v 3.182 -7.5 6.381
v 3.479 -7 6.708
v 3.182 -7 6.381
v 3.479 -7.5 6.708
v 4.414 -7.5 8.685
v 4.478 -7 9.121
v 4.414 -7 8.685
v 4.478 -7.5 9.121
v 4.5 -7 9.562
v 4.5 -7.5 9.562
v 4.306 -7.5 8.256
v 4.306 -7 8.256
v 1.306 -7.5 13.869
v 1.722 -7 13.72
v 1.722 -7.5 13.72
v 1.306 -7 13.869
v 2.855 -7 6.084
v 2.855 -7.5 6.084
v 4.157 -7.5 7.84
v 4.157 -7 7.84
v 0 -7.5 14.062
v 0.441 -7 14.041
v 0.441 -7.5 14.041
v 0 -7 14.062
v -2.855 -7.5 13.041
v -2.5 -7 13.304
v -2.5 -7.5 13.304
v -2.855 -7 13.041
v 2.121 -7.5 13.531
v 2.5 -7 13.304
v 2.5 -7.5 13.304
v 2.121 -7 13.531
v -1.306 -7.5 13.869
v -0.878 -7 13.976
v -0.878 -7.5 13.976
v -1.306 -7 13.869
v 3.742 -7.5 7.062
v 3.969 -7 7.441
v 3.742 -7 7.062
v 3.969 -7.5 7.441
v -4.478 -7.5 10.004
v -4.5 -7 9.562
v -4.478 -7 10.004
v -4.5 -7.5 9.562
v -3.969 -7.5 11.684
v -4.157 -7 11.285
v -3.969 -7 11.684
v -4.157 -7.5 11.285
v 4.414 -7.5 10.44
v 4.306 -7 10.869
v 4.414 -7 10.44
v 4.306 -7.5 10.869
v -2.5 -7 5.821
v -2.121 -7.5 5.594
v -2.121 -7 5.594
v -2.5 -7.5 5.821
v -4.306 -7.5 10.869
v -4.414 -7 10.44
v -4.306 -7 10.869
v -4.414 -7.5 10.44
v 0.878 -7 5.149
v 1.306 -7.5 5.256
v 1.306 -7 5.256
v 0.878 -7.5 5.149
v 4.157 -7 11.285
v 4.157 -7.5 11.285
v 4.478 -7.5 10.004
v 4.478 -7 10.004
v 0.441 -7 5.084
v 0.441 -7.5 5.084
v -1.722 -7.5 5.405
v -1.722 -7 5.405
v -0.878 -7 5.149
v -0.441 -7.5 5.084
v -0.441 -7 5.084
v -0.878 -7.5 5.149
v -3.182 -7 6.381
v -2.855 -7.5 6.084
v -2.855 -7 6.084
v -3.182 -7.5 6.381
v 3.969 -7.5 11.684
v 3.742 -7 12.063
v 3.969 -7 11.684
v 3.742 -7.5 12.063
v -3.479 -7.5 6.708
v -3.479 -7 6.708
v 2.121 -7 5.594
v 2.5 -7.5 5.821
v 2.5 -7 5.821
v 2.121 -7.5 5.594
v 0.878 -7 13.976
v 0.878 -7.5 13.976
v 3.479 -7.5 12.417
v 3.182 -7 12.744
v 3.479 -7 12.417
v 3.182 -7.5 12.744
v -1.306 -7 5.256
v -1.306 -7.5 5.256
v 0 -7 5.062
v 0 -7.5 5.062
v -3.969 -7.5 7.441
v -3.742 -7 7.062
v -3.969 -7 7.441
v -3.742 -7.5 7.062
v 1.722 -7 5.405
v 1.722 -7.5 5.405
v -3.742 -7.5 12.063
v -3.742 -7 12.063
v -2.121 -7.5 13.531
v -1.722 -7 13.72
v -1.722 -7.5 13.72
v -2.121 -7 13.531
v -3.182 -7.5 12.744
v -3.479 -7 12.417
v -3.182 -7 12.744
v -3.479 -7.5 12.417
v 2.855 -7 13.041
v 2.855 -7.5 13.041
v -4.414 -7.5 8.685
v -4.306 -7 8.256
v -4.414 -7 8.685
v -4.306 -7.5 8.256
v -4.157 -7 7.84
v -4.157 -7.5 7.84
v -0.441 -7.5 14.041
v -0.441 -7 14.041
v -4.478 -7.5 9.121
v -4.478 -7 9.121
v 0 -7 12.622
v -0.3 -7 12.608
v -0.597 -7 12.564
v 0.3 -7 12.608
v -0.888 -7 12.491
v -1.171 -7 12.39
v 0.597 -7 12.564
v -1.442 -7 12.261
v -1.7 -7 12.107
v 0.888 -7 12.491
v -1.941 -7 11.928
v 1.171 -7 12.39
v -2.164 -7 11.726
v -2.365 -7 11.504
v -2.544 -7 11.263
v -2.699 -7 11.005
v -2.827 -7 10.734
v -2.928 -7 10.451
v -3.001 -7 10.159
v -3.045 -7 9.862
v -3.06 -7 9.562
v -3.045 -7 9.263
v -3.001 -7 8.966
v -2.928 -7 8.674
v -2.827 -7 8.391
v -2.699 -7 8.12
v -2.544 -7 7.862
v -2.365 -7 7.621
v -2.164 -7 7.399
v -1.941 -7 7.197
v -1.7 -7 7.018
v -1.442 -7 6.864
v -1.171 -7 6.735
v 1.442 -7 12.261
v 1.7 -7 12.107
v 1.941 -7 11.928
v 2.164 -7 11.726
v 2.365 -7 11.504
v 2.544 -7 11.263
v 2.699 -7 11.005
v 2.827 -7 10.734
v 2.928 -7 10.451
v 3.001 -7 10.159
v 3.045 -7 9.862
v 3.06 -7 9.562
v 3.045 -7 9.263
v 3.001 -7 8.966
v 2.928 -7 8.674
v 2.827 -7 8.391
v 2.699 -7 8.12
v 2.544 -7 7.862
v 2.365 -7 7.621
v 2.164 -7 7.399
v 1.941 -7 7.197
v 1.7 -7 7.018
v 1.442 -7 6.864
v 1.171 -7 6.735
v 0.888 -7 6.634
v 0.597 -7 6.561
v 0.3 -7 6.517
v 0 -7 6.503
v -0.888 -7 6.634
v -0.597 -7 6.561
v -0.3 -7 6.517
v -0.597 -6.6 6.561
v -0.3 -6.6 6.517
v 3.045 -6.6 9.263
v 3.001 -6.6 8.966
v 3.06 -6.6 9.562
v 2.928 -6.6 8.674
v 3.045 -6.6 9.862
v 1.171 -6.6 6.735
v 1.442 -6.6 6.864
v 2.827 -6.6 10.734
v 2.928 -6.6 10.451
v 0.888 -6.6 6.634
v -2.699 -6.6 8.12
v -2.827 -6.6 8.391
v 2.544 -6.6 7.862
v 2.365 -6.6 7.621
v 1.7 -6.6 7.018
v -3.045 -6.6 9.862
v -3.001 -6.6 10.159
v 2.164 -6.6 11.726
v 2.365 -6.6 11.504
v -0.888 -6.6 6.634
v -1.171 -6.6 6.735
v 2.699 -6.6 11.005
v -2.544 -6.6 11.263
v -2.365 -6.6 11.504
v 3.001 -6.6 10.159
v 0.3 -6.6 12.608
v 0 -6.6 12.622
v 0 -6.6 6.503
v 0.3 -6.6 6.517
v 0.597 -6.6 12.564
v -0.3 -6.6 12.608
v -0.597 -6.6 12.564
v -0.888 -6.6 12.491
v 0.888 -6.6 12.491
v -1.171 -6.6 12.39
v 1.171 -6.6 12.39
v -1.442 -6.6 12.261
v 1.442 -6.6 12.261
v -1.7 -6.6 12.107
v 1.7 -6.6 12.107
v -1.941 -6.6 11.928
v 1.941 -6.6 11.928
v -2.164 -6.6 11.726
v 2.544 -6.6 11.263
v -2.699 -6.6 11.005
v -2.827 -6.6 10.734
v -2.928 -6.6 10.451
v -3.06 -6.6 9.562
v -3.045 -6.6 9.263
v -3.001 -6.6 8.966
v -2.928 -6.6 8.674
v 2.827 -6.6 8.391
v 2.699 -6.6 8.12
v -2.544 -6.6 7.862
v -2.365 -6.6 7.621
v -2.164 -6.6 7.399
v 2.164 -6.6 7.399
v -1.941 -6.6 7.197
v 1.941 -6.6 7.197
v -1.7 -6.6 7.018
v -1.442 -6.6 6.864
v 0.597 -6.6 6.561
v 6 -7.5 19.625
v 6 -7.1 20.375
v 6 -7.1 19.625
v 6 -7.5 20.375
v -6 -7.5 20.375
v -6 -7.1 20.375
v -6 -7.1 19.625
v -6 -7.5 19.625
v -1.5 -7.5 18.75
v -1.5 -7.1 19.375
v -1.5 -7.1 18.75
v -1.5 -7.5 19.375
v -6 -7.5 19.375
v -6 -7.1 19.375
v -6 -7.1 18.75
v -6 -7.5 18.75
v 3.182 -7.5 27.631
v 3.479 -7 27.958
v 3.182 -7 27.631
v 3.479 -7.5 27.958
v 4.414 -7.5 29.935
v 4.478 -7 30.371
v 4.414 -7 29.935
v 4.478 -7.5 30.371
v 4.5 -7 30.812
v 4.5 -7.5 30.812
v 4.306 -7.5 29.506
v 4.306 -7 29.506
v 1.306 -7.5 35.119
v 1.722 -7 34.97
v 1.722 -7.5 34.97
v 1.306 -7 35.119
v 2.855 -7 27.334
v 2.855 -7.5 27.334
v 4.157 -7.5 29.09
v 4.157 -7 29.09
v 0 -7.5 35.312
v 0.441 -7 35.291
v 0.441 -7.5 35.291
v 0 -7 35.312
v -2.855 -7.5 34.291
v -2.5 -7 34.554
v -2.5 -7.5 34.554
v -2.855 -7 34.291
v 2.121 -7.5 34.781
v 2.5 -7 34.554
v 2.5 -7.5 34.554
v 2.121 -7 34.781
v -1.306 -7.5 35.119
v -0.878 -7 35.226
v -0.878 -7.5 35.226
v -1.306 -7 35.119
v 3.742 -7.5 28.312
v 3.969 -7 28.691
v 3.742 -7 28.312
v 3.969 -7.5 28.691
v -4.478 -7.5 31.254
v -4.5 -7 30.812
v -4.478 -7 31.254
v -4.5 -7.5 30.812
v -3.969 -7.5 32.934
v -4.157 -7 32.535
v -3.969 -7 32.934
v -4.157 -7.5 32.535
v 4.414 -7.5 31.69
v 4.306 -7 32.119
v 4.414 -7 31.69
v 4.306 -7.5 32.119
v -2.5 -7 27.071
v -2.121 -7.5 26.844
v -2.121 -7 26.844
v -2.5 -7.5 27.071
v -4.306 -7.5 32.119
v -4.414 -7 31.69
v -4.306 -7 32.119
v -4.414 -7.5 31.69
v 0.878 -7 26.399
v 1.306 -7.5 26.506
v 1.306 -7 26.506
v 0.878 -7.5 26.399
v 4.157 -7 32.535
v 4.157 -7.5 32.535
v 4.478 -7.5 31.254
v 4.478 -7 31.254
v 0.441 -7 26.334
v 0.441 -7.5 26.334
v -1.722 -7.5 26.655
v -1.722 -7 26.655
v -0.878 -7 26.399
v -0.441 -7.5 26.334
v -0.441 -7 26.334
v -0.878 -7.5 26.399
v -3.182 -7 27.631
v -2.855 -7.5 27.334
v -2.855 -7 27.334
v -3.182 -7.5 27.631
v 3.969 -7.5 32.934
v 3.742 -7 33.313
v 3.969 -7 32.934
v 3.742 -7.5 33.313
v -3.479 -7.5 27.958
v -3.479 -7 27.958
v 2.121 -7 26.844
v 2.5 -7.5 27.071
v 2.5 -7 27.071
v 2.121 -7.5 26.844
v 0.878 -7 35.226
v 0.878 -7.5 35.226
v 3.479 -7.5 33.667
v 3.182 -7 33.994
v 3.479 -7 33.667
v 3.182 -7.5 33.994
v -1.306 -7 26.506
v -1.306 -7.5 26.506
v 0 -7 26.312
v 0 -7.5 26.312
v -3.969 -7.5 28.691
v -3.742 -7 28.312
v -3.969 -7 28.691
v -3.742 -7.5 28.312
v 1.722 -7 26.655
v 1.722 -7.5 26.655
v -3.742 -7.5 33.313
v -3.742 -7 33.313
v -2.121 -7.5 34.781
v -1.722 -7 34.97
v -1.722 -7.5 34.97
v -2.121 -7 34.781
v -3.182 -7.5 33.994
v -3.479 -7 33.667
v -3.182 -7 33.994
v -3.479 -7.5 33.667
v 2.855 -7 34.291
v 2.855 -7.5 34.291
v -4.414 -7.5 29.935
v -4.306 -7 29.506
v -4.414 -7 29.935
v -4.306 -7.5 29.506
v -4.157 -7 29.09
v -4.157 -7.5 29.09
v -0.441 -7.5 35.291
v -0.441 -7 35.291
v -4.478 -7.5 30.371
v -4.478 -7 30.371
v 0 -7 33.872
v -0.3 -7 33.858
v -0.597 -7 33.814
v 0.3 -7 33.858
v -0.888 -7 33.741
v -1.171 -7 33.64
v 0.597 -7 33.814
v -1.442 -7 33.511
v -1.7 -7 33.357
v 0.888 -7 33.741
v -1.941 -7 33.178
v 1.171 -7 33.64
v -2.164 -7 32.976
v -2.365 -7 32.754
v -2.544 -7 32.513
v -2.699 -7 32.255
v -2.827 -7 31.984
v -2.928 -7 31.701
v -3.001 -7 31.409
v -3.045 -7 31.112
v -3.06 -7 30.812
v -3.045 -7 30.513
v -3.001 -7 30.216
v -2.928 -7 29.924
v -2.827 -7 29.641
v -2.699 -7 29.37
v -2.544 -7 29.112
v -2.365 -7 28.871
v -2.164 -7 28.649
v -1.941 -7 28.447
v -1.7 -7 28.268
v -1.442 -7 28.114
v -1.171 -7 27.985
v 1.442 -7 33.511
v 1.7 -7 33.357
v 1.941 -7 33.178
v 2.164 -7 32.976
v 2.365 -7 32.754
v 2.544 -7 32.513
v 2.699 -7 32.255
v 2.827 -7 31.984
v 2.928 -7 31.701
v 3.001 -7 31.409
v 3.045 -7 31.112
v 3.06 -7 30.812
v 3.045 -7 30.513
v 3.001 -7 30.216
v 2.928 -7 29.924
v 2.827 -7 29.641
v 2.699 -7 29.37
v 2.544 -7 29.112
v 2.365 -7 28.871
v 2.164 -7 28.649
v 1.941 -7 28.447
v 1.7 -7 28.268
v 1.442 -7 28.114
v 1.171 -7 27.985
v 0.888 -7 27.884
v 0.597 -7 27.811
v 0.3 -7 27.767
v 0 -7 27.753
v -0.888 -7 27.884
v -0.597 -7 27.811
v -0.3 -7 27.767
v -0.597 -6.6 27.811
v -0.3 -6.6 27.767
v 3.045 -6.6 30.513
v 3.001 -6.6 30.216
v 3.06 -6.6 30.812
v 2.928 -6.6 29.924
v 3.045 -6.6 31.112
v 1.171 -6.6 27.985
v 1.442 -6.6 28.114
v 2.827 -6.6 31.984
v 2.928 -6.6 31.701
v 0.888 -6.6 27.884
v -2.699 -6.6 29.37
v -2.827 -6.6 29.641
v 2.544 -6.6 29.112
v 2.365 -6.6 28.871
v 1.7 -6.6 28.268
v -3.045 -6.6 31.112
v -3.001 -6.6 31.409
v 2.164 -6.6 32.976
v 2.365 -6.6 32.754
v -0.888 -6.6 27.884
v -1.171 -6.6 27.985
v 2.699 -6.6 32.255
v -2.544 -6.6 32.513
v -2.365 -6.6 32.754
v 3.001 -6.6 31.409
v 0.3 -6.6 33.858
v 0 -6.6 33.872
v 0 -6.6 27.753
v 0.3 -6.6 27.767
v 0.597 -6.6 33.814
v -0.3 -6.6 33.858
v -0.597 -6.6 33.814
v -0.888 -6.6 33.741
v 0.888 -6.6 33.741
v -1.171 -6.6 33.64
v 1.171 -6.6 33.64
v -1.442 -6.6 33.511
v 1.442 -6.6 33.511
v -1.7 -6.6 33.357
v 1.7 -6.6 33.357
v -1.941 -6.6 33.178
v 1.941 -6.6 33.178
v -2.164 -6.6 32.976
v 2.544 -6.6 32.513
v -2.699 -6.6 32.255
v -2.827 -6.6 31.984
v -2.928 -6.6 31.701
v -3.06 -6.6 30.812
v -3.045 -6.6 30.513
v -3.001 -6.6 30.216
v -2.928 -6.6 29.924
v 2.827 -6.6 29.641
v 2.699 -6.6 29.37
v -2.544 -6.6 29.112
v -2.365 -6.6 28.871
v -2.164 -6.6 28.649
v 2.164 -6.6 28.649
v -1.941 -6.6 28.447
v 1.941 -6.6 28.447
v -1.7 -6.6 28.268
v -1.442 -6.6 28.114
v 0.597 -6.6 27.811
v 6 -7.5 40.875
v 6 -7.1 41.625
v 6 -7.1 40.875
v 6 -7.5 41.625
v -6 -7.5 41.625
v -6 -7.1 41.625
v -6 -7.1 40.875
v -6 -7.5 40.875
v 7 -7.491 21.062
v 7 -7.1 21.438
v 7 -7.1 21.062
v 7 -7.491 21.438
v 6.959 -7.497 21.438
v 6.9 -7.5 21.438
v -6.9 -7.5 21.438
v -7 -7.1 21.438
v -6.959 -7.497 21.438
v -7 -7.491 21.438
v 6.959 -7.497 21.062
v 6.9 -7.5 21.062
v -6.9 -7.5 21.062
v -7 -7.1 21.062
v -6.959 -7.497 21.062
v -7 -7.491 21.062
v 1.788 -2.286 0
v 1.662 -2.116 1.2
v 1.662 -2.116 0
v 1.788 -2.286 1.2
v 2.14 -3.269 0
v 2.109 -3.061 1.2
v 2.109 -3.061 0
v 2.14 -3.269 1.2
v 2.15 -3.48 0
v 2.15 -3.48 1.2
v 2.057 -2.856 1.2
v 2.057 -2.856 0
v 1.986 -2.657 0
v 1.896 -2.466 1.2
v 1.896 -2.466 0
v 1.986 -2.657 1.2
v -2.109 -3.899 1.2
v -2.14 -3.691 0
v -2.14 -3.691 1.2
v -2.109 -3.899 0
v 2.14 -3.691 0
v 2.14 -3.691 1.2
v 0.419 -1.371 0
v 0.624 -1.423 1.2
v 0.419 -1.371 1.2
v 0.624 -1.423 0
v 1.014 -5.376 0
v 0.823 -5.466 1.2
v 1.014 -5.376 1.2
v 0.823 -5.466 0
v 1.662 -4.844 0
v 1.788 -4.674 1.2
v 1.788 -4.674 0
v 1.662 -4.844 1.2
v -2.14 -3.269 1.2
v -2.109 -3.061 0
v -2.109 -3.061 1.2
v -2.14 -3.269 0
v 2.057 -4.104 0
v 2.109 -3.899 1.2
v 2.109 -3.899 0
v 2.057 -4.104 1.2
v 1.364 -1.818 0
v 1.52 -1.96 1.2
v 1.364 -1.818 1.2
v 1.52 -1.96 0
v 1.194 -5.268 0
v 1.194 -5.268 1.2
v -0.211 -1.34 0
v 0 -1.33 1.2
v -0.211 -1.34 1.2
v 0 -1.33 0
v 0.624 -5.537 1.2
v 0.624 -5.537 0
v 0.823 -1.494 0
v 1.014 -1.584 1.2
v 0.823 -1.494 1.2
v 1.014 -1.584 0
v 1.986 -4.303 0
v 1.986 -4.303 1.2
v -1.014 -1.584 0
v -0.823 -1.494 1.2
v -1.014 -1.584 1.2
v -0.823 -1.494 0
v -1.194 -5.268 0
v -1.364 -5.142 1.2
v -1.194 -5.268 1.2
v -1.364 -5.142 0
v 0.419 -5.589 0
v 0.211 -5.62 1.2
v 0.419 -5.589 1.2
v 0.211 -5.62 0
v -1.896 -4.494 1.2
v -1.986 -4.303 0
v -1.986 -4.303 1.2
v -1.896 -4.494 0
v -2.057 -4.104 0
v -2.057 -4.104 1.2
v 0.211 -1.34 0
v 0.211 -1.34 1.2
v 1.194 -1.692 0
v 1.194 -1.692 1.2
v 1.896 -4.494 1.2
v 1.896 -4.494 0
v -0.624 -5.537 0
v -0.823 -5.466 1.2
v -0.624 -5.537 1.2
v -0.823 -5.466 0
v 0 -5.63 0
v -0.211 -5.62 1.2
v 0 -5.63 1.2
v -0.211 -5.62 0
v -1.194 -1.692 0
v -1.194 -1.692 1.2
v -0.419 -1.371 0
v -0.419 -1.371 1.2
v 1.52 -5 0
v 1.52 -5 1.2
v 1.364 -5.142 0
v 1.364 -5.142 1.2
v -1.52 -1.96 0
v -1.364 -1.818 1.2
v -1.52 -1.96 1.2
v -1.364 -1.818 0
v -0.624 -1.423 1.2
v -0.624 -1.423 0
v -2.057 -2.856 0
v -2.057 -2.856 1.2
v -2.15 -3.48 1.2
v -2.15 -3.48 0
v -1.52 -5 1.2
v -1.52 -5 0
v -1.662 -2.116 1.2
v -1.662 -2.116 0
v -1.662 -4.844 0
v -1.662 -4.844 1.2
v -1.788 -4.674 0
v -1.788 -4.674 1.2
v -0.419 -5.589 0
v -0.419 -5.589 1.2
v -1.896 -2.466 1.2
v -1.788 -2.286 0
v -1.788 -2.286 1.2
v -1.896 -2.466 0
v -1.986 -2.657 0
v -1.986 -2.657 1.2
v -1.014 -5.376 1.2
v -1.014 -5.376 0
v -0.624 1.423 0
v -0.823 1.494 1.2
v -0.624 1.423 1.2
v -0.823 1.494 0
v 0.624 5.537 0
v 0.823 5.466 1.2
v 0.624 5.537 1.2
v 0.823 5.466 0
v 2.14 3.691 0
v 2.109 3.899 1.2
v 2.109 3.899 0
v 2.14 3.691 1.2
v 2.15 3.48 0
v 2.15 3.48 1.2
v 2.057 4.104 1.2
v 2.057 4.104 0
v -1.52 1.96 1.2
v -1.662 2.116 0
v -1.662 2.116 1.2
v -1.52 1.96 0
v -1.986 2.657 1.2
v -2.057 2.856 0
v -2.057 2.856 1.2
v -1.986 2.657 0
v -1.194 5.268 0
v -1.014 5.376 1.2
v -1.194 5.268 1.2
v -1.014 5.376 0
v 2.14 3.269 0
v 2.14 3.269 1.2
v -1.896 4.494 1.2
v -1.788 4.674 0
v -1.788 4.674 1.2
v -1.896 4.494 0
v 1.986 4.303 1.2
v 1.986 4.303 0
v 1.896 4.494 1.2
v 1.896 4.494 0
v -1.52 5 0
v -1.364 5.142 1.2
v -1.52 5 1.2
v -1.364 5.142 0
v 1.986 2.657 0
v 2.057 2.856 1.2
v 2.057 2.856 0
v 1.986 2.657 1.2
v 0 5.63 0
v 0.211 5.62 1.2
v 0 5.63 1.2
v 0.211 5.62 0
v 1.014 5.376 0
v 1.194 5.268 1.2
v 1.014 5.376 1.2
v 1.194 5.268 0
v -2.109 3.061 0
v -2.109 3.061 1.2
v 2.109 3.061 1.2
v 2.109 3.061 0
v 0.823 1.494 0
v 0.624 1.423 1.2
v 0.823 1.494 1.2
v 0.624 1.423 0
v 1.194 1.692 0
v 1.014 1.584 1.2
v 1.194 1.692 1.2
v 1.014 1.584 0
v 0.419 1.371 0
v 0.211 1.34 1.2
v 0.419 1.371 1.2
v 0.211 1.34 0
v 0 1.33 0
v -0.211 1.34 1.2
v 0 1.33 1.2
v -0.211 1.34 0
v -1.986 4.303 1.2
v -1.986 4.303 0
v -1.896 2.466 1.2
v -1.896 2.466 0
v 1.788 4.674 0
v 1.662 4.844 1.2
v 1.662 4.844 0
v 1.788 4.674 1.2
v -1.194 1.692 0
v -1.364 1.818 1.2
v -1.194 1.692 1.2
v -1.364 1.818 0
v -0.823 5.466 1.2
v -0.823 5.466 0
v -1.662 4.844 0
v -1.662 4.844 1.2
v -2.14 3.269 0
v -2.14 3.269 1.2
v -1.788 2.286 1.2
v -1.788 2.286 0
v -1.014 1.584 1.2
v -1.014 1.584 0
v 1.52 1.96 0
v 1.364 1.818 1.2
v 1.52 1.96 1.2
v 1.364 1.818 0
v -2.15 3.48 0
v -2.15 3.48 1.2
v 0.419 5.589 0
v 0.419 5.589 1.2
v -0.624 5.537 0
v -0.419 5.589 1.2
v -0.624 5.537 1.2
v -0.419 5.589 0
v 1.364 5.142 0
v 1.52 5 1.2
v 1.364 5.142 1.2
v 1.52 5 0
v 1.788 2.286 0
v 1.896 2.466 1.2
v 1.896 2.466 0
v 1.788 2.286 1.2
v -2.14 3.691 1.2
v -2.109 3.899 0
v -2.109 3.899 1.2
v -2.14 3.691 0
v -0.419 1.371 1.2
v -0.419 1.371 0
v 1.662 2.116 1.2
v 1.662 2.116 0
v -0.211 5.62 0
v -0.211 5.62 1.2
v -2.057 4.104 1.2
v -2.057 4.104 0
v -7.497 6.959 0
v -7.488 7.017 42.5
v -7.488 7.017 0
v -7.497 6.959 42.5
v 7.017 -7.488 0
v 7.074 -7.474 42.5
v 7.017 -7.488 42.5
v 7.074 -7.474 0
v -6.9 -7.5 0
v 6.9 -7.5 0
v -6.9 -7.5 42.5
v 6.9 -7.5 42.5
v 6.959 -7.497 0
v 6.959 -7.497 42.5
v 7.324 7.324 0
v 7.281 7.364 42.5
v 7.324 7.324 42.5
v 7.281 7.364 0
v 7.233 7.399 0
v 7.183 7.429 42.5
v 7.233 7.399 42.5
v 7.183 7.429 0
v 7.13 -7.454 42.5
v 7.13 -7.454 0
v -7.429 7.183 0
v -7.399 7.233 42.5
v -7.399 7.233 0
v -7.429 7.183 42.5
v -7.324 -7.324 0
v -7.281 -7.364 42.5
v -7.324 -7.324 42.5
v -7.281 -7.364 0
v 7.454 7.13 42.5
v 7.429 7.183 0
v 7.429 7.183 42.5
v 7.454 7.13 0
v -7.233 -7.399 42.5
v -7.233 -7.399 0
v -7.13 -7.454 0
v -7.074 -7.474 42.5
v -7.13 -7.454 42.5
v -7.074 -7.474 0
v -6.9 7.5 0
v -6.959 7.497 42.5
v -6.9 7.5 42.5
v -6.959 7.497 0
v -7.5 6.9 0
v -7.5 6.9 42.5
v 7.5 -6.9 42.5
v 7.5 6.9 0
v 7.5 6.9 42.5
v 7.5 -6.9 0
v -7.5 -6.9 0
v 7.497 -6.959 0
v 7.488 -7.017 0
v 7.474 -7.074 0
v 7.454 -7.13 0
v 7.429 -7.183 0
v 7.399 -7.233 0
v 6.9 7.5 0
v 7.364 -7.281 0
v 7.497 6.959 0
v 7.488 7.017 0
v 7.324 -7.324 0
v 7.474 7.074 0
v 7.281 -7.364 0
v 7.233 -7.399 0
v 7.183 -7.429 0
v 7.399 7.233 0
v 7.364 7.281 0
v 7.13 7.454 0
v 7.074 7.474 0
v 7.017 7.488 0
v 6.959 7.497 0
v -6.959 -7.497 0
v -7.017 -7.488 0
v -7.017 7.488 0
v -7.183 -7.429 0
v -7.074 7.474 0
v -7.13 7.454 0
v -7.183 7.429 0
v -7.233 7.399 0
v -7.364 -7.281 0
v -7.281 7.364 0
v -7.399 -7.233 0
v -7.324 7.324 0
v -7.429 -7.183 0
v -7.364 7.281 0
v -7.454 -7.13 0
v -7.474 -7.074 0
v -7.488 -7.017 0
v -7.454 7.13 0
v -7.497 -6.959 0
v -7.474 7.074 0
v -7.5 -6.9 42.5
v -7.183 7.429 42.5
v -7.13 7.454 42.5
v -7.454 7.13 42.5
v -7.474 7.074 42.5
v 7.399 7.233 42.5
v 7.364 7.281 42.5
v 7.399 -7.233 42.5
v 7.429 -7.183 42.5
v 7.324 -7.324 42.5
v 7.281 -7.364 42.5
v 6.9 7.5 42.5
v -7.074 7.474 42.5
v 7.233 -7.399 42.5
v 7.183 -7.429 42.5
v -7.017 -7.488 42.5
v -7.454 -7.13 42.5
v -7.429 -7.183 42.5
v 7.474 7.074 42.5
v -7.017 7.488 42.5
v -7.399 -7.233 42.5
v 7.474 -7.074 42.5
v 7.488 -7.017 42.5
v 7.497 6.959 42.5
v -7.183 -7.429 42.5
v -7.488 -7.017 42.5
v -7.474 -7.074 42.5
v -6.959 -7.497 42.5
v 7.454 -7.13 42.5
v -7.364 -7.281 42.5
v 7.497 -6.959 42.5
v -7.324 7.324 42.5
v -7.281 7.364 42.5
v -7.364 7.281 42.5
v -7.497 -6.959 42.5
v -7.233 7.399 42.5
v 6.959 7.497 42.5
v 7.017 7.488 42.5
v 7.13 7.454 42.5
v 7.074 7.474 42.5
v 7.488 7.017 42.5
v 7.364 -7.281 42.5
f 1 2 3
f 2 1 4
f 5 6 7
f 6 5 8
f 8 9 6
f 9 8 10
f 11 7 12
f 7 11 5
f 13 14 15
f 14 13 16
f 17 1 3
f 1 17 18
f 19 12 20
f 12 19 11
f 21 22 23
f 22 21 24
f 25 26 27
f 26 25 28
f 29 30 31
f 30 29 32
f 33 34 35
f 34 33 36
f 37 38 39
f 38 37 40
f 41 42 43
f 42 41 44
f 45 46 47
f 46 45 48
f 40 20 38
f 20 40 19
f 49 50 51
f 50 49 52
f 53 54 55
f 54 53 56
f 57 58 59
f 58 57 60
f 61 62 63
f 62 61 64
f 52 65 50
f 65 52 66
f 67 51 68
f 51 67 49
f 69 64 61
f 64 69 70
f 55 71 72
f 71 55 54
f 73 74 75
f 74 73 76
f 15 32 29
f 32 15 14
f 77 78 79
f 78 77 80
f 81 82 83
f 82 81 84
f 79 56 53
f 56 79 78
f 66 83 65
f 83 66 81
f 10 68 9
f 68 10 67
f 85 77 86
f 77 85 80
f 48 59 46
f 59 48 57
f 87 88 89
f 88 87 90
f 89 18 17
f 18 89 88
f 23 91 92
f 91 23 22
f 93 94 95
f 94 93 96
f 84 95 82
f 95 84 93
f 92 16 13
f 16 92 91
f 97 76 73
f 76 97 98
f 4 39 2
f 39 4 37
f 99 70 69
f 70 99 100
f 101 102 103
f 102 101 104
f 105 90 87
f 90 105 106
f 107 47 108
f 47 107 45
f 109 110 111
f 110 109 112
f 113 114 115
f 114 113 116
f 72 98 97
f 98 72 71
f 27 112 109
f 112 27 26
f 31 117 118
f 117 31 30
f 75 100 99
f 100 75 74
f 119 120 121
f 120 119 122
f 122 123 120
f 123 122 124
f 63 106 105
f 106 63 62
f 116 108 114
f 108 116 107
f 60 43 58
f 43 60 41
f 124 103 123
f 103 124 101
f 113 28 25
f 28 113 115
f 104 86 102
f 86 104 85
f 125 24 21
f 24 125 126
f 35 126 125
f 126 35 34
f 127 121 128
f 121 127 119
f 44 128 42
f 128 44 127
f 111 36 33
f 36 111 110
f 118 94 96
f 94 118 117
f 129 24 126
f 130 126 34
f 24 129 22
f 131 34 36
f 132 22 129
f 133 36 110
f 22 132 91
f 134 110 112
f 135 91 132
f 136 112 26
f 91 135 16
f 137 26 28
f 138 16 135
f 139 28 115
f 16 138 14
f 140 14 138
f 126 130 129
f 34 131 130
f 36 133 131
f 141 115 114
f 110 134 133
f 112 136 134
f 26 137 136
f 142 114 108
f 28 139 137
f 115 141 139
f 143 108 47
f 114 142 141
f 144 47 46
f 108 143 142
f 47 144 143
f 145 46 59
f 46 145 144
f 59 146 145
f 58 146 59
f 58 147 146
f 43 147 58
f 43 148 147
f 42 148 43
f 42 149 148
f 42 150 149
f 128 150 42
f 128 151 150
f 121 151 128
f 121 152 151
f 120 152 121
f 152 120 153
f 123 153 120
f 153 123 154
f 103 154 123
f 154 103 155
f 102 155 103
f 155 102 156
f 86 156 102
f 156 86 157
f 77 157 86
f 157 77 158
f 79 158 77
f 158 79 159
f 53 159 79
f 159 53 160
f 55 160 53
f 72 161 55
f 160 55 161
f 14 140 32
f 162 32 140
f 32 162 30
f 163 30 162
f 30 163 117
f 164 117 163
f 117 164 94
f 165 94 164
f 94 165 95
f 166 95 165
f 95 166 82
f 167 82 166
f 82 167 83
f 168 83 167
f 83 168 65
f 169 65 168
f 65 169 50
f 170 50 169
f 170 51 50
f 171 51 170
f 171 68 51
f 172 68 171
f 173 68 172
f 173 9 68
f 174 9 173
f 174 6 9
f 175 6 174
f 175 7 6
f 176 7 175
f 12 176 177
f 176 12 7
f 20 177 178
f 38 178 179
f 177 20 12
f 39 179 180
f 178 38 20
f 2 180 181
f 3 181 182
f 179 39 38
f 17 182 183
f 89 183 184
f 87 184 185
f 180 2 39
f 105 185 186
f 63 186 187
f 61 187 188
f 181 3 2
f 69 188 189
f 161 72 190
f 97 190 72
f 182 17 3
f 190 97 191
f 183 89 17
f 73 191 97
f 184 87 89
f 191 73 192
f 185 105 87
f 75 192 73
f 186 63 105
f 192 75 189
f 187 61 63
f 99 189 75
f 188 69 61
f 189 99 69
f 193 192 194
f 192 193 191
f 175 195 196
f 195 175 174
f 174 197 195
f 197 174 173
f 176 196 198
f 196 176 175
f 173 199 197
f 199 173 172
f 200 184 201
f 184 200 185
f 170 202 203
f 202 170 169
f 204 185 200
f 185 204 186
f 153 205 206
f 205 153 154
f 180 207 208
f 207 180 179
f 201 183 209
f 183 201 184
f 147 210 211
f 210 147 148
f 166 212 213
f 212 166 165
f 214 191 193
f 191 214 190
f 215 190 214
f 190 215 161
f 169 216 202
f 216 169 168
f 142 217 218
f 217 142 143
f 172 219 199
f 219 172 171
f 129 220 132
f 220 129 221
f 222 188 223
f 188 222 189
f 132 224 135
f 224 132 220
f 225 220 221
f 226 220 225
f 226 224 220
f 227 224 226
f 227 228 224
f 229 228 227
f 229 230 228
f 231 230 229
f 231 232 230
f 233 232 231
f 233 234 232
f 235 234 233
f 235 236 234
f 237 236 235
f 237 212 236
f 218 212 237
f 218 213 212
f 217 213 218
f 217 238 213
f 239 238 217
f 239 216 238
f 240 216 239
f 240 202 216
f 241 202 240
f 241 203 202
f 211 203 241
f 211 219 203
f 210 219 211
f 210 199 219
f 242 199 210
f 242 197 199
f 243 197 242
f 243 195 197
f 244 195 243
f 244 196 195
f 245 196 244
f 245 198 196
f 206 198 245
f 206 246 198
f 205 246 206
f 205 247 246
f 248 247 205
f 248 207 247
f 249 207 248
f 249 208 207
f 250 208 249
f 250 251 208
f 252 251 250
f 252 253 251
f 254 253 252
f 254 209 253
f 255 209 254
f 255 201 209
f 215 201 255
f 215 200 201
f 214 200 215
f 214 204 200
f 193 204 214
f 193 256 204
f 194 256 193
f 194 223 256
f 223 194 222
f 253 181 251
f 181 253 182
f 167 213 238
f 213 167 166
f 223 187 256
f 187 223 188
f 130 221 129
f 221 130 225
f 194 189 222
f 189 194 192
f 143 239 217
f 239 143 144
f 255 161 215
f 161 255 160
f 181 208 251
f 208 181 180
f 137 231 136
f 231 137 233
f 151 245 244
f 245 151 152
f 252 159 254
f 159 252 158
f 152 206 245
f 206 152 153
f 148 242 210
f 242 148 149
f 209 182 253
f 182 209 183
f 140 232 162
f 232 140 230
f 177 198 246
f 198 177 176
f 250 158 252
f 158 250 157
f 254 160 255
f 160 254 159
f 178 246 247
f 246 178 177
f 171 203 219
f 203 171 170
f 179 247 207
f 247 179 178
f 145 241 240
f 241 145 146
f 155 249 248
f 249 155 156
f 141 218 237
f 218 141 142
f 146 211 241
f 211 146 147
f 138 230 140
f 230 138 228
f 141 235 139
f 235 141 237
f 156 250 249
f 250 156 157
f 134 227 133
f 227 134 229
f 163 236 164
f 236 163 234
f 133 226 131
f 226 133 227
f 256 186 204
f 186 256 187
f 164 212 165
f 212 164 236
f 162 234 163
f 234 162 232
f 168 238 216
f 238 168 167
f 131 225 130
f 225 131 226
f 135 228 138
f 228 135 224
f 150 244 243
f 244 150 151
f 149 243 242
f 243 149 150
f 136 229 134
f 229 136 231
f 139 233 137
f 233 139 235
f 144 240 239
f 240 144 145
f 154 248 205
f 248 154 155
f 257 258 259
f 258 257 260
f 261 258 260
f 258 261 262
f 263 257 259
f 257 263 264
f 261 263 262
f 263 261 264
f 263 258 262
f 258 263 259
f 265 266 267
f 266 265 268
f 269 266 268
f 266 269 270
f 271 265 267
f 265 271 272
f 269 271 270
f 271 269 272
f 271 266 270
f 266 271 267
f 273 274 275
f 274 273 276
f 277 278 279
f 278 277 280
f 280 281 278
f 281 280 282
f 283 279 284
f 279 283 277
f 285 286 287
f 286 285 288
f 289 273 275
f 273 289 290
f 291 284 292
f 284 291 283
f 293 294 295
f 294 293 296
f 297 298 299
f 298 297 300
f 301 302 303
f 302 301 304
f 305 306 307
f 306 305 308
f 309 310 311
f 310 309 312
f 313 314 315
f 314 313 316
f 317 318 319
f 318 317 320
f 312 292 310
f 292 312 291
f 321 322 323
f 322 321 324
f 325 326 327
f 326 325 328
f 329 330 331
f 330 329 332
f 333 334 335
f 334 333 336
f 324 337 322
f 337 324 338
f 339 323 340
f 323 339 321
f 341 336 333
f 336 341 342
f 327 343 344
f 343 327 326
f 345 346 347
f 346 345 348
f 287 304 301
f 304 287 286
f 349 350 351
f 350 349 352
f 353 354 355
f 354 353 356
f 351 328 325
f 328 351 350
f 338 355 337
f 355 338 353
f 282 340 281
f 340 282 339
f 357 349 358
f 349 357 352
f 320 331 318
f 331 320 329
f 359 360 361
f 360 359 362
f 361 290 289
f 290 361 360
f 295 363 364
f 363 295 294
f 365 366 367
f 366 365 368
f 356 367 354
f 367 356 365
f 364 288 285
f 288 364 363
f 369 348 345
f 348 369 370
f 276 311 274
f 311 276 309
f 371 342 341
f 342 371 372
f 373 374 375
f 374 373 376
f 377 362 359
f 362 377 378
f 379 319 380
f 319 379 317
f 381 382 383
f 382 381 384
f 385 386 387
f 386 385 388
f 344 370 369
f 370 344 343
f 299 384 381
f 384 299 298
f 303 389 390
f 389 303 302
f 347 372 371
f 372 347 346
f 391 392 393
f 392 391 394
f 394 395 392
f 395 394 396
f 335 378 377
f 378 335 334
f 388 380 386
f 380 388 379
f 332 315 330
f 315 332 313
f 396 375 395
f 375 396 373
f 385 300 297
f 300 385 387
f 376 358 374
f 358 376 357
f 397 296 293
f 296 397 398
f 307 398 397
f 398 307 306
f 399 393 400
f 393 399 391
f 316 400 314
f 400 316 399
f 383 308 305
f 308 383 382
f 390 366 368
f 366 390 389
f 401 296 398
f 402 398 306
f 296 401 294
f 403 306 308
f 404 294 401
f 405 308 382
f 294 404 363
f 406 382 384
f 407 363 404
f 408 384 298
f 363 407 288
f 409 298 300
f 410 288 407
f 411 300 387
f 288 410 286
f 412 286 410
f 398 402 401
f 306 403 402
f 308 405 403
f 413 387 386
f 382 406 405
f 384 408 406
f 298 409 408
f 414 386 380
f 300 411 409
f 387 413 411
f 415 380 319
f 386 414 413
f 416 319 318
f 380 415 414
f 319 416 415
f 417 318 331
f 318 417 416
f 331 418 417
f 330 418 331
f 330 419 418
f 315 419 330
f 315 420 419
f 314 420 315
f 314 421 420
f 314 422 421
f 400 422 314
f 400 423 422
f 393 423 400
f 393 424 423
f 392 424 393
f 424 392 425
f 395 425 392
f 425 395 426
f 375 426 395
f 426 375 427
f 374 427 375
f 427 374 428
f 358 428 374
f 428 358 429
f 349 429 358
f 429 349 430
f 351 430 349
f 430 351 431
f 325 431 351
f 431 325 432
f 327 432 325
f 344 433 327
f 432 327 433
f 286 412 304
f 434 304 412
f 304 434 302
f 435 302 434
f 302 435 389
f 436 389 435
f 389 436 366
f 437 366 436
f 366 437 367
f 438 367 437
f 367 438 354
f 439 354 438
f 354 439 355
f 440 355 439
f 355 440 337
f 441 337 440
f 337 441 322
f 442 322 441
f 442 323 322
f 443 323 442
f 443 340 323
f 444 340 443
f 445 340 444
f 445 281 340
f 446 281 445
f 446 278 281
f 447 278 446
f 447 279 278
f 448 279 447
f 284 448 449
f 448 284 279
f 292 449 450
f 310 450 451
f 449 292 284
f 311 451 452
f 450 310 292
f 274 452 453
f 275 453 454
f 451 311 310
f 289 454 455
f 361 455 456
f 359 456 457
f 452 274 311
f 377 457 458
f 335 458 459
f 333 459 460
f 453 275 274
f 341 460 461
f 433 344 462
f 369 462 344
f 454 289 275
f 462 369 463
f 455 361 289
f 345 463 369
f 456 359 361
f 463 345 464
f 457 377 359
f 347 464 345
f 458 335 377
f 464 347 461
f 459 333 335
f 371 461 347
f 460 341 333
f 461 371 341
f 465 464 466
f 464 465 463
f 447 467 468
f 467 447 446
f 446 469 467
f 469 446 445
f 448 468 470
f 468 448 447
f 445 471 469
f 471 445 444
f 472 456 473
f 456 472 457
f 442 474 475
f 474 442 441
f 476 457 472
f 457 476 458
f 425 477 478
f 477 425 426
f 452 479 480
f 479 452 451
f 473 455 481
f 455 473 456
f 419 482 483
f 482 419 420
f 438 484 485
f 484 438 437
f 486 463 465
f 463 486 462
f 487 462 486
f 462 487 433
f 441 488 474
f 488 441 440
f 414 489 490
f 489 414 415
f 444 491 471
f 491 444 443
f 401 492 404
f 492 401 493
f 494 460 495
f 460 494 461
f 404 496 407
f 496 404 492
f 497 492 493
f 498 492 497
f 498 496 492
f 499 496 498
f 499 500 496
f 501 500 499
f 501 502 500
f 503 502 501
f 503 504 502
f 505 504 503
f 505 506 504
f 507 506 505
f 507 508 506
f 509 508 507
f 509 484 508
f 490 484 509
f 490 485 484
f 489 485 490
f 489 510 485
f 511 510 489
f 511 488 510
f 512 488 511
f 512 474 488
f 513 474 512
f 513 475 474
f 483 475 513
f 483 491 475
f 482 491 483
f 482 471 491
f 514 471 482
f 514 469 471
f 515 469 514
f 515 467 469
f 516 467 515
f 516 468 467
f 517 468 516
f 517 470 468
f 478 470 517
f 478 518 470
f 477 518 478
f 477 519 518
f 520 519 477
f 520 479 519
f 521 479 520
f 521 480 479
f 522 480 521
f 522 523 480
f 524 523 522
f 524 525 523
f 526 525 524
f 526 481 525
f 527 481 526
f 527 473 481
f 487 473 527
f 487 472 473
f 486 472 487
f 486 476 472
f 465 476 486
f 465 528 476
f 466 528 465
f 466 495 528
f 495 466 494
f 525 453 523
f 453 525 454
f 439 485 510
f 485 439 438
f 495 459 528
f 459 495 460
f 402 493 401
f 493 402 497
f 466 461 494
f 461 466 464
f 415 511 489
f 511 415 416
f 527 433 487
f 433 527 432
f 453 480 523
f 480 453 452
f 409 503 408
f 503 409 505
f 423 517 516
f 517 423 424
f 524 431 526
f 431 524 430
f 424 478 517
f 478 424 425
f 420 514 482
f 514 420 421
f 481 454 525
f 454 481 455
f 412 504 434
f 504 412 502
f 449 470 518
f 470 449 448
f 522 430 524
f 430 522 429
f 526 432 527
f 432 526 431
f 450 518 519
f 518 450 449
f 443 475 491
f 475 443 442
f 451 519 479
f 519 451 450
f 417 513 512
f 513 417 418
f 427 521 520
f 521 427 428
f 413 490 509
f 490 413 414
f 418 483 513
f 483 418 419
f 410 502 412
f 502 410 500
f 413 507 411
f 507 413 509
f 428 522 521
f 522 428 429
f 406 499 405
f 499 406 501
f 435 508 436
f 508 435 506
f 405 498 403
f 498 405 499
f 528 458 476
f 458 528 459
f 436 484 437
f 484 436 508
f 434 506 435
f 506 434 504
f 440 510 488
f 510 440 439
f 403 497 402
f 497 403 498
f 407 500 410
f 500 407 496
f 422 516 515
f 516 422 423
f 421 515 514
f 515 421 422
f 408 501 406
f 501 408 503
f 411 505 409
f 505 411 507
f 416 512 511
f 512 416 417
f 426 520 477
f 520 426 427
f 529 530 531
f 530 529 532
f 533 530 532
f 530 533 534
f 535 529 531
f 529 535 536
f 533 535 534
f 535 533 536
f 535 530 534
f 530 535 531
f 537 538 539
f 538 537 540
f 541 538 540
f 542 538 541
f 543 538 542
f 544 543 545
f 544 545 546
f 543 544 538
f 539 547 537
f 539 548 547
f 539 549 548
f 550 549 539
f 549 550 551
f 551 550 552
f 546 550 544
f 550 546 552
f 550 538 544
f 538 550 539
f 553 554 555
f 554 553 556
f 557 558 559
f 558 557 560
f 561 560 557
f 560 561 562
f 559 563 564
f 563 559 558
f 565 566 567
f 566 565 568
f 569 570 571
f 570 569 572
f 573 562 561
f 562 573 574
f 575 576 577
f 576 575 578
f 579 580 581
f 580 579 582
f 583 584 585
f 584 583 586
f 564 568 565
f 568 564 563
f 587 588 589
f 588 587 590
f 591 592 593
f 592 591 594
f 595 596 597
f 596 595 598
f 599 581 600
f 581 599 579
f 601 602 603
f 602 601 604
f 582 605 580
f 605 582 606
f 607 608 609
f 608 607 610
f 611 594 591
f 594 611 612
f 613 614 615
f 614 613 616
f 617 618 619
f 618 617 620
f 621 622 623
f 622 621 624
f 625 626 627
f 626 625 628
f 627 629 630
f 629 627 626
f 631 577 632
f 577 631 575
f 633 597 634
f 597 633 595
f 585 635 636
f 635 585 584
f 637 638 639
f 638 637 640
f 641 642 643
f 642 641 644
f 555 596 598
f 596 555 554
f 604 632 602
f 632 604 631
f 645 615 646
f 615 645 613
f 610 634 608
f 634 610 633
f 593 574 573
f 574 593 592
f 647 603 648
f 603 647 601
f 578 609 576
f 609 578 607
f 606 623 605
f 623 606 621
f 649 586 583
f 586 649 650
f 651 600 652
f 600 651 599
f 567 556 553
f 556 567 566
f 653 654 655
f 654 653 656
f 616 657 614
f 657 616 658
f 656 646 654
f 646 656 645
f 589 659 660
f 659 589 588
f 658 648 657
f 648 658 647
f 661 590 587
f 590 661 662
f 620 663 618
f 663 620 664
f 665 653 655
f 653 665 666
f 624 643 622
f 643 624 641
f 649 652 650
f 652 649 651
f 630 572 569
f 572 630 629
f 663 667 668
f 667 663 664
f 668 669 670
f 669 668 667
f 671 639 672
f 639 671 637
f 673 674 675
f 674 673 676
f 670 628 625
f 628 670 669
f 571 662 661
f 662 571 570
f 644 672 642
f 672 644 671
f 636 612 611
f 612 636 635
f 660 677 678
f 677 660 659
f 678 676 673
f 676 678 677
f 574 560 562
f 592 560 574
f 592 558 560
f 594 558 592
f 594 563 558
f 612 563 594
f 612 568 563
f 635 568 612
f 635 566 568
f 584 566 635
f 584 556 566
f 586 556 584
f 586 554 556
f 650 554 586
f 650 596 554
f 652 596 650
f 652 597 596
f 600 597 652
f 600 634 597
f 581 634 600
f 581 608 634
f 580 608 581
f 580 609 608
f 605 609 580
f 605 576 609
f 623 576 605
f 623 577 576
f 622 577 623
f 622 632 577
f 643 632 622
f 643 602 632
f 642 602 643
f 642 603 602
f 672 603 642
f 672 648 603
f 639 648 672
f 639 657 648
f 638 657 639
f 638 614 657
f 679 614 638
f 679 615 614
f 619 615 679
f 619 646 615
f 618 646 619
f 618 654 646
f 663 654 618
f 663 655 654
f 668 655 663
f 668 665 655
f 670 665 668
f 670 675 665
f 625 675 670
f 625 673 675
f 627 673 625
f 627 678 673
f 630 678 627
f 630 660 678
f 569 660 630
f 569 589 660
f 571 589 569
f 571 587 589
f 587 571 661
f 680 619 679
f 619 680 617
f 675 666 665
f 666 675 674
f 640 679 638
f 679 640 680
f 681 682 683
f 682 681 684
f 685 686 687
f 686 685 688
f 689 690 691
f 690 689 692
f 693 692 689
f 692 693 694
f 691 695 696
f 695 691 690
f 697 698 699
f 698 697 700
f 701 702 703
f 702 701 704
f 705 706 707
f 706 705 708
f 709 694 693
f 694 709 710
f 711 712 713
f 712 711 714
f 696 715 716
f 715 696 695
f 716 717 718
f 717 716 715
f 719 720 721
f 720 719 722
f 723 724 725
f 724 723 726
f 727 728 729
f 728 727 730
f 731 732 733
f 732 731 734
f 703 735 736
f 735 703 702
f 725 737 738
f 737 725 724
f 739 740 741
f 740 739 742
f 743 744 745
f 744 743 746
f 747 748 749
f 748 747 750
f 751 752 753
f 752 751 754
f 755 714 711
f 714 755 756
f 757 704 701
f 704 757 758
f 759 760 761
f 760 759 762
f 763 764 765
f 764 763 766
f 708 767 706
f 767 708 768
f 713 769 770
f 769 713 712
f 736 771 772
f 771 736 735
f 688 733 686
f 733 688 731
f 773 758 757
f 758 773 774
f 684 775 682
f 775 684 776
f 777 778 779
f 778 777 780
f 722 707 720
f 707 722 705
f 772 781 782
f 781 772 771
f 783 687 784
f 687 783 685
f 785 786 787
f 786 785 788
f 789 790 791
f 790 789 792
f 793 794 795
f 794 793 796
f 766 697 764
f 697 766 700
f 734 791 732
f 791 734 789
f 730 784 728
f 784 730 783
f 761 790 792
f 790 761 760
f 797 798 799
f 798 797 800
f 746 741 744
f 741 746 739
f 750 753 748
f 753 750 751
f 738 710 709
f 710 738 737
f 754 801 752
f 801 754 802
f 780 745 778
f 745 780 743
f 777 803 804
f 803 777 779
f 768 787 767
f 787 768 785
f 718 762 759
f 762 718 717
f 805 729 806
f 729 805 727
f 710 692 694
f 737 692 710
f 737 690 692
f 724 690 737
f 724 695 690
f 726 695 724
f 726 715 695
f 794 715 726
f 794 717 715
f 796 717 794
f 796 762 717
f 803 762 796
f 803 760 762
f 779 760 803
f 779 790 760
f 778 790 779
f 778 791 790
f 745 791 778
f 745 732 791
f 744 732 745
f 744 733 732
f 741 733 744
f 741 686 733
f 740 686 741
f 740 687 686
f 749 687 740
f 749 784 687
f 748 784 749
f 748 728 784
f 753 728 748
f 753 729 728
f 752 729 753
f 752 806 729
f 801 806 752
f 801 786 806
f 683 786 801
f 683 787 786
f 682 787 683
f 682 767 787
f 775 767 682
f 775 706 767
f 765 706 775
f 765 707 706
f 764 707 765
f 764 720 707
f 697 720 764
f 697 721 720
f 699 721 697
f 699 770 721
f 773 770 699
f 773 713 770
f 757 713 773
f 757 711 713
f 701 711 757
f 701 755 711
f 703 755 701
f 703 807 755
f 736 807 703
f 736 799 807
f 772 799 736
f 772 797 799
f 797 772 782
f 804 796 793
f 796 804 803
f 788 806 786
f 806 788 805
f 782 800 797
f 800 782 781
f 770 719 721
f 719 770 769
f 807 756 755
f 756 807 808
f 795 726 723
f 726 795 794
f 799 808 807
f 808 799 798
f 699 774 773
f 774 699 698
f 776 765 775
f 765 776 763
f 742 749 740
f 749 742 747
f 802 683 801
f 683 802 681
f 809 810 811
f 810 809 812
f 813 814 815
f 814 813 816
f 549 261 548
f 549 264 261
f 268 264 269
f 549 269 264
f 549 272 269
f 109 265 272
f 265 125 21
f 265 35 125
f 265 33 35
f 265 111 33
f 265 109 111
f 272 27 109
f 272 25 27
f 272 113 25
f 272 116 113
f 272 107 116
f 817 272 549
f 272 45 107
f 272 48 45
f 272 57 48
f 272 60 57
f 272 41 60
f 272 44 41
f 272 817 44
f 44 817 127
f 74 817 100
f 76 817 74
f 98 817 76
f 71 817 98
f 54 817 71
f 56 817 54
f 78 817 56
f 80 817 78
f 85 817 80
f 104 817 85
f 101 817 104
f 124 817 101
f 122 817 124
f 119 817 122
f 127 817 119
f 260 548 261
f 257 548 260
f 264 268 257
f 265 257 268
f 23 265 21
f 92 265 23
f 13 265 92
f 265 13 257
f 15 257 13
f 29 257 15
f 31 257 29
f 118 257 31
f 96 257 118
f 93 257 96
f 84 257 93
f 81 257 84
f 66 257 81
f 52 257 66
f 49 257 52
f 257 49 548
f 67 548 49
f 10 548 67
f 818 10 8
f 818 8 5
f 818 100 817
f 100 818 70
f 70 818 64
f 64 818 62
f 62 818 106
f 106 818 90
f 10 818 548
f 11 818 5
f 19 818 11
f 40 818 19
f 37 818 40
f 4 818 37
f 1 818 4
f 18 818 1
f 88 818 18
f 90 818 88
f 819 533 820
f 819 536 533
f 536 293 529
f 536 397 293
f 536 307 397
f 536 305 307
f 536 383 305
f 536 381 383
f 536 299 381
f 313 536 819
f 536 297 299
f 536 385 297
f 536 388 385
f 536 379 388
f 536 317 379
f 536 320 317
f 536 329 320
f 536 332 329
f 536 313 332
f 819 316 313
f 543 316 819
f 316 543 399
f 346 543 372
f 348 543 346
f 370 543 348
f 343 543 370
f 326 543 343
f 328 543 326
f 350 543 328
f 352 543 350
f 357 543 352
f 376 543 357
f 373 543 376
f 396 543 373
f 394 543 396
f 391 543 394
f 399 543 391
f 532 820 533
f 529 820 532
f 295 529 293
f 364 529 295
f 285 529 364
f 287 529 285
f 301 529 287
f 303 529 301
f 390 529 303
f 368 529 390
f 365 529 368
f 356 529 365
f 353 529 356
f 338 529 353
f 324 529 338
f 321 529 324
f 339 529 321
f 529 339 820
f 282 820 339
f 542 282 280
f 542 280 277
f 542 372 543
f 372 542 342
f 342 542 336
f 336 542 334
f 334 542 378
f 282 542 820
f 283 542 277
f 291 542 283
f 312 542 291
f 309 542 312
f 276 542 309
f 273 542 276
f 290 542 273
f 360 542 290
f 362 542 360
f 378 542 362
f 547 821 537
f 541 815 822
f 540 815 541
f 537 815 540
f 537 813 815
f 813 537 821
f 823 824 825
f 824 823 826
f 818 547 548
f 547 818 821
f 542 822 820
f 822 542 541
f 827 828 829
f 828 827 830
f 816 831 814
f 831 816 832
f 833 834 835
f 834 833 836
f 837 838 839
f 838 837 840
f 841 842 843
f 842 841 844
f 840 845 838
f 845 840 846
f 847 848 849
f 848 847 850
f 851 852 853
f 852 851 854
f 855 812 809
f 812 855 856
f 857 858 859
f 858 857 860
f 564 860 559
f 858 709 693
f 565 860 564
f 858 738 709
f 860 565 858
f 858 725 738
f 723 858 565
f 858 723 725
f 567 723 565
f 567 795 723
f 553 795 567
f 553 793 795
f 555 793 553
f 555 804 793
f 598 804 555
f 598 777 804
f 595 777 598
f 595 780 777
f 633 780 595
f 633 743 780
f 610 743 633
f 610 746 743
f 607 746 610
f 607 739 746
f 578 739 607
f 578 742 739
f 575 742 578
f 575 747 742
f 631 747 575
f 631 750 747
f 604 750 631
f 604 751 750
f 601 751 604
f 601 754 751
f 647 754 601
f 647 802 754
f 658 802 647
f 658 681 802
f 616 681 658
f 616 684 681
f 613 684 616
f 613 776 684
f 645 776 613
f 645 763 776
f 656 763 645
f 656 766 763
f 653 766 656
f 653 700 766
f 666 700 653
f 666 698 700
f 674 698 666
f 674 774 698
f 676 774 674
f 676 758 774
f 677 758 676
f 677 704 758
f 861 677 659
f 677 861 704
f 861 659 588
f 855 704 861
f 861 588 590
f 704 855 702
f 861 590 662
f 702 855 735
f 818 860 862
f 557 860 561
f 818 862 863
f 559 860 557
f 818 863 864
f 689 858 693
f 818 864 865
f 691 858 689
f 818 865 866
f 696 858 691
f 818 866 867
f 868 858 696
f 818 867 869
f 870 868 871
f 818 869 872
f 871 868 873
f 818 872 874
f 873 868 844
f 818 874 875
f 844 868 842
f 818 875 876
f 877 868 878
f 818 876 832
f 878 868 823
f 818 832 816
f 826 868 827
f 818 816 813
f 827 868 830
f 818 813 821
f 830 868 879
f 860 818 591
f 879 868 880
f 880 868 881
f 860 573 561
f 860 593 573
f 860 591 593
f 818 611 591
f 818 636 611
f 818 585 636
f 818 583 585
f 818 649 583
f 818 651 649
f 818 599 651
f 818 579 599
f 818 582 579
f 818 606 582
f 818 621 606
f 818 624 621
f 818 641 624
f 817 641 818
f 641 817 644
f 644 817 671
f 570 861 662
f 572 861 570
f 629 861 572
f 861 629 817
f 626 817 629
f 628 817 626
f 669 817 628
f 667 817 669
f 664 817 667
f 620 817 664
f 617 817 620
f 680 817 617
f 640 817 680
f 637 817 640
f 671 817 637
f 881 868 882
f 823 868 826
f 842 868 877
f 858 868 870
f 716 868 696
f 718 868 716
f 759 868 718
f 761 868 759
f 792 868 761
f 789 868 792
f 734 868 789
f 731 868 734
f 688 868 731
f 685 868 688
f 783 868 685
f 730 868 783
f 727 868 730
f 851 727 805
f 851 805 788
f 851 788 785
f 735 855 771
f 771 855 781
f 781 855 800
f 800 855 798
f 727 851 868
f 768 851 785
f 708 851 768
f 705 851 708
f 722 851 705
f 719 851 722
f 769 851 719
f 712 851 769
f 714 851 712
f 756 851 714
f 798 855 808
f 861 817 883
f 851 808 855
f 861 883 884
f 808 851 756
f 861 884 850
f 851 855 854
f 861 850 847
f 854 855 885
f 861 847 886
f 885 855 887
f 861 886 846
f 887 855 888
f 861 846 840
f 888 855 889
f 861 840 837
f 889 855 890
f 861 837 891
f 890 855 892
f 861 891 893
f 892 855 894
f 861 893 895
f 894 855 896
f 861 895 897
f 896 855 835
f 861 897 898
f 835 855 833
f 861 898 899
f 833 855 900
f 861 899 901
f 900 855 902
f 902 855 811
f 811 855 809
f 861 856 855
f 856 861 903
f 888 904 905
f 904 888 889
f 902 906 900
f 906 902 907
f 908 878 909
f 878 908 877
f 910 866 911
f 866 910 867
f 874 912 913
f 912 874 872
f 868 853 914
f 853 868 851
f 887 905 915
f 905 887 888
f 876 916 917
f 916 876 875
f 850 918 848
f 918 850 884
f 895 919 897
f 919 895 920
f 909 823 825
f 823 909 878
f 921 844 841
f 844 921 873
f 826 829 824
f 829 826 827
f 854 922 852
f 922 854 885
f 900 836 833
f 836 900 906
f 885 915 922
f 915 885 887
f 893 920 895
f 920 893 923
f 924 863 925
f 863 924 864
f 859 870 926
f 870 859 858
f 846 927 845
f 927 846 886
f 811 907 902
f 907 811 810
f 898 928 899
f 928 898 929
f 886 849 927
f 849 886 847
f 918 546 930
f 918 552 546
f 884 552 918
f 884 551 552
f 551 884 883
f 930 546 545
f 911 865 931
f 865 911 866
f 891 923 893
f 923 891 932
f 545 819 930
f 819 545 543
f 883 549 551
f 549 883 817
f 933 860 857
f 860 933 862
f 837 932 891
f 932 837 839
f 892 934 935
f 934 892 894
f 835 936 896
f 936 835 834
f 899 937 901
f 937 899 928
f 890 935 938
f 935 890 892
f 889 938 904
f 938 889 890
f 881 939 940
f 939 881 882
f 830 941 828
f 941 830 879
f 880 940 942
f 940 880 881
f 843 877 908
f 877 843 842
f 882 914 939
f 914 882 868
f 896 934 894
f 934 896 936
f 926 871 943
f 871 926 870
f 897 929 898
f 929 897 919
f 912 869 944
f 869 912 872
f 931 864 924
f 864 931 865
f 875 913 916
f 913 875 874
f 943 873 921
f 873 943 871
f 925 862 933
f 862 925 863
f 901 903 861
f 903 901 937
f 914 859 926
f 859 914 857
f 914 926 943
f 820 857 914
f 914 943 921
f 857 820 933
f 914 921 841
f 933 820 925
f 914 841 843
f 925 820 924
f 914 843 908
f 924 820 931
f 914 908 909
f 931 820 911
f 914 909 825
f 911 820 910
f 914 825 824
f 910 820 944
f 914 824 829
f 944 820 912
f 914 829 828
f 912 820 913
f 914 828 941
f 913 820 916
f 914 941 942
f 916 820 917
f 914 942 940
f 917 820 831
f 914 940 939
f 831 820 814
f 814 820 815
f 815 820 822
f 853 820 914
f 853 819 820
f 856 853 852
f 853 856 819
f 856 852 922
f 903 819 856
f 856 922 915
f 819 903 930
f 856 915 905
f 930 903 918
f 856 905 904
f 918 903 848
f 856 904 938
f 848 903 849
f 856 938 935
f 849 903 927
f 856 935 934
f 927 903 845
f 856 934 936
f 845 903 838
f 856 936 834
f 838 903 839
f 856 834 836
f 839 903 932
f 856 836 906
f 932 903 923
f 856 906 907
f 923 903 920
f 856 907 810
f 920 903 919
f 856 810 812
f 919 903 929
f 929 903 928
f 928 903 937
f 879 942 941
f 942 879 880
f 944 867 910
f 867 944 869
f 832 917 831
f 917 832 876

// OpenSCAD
// laundry / washer_dryer_stack — a stacked washer-dryer tower: the washing machine
// on the bottom and the tumble dryer on top, one 60x60 footprint carrying both. Two
// porthole doors on the FRONT (-Y) face — the lower one with a detergent drawer (the
// washer), the upper one without (the dryer) — split by a seam groove where the two
// cases meet. The doors, fascias, drawer and seam are all cut into the front face;
// see appliance_front() in lib/common.scad.
//
// Width/Depth are the real-world footprint in cm: 60x60, a single machine's. Height
// is the real height of the whole tower — two 85 cm cases, so 170 cm — shrunk by the
// plan scale like the footprint (see printed_h() in lib/common.scad). The two cases
// are equal, so the seam sits at half the printed height.
//
// The front is the -Y edge; rotate the piece on the board to face it into the room.

include <../lib/common.scad>

Width  = 60;   // cm
Depth  = 60;   // cm
Height = 170;  // cm — the whole tower: a washer case plus a dryer case

Print_h = printed_h(Height);   // printed height, mm — Height at the plan scale
Seam_z  = Print_h / 2;         // printed mm up the front where the two cases meet

// The two doors + fascias + the washer's drawer + the seam, on the front (-Y) face.
// See appliance_front() in lib/common.scad for the proportions.
Show_front = true;

// Magnet pockets in the bottom face (0 = none). A tall, narrow tower — two pockets
// keep it from pivoting; see Magnet_* in lib/common.scad.
Magnets = 2;

washer_dryer_stack();

module washer_dryer_stack() {
    difference() {
        footprint(Width, Depth, Print_h);
        if (Show_front) {
            appliance_front(Width, Depth, 0, Seam_z, drawer = true);        // washer
            appliance_front(Width, Depth, Seam_z, Print_h, drawer = false); // dryer
            // the seam where the two cases butt together
            front_recess(0, Seam_z, cm(Width - 4), rise(1.5), Depth);
        }
        if (Magnets > 0)
            magnets(Width, Depth, Magnets);
    }
}
